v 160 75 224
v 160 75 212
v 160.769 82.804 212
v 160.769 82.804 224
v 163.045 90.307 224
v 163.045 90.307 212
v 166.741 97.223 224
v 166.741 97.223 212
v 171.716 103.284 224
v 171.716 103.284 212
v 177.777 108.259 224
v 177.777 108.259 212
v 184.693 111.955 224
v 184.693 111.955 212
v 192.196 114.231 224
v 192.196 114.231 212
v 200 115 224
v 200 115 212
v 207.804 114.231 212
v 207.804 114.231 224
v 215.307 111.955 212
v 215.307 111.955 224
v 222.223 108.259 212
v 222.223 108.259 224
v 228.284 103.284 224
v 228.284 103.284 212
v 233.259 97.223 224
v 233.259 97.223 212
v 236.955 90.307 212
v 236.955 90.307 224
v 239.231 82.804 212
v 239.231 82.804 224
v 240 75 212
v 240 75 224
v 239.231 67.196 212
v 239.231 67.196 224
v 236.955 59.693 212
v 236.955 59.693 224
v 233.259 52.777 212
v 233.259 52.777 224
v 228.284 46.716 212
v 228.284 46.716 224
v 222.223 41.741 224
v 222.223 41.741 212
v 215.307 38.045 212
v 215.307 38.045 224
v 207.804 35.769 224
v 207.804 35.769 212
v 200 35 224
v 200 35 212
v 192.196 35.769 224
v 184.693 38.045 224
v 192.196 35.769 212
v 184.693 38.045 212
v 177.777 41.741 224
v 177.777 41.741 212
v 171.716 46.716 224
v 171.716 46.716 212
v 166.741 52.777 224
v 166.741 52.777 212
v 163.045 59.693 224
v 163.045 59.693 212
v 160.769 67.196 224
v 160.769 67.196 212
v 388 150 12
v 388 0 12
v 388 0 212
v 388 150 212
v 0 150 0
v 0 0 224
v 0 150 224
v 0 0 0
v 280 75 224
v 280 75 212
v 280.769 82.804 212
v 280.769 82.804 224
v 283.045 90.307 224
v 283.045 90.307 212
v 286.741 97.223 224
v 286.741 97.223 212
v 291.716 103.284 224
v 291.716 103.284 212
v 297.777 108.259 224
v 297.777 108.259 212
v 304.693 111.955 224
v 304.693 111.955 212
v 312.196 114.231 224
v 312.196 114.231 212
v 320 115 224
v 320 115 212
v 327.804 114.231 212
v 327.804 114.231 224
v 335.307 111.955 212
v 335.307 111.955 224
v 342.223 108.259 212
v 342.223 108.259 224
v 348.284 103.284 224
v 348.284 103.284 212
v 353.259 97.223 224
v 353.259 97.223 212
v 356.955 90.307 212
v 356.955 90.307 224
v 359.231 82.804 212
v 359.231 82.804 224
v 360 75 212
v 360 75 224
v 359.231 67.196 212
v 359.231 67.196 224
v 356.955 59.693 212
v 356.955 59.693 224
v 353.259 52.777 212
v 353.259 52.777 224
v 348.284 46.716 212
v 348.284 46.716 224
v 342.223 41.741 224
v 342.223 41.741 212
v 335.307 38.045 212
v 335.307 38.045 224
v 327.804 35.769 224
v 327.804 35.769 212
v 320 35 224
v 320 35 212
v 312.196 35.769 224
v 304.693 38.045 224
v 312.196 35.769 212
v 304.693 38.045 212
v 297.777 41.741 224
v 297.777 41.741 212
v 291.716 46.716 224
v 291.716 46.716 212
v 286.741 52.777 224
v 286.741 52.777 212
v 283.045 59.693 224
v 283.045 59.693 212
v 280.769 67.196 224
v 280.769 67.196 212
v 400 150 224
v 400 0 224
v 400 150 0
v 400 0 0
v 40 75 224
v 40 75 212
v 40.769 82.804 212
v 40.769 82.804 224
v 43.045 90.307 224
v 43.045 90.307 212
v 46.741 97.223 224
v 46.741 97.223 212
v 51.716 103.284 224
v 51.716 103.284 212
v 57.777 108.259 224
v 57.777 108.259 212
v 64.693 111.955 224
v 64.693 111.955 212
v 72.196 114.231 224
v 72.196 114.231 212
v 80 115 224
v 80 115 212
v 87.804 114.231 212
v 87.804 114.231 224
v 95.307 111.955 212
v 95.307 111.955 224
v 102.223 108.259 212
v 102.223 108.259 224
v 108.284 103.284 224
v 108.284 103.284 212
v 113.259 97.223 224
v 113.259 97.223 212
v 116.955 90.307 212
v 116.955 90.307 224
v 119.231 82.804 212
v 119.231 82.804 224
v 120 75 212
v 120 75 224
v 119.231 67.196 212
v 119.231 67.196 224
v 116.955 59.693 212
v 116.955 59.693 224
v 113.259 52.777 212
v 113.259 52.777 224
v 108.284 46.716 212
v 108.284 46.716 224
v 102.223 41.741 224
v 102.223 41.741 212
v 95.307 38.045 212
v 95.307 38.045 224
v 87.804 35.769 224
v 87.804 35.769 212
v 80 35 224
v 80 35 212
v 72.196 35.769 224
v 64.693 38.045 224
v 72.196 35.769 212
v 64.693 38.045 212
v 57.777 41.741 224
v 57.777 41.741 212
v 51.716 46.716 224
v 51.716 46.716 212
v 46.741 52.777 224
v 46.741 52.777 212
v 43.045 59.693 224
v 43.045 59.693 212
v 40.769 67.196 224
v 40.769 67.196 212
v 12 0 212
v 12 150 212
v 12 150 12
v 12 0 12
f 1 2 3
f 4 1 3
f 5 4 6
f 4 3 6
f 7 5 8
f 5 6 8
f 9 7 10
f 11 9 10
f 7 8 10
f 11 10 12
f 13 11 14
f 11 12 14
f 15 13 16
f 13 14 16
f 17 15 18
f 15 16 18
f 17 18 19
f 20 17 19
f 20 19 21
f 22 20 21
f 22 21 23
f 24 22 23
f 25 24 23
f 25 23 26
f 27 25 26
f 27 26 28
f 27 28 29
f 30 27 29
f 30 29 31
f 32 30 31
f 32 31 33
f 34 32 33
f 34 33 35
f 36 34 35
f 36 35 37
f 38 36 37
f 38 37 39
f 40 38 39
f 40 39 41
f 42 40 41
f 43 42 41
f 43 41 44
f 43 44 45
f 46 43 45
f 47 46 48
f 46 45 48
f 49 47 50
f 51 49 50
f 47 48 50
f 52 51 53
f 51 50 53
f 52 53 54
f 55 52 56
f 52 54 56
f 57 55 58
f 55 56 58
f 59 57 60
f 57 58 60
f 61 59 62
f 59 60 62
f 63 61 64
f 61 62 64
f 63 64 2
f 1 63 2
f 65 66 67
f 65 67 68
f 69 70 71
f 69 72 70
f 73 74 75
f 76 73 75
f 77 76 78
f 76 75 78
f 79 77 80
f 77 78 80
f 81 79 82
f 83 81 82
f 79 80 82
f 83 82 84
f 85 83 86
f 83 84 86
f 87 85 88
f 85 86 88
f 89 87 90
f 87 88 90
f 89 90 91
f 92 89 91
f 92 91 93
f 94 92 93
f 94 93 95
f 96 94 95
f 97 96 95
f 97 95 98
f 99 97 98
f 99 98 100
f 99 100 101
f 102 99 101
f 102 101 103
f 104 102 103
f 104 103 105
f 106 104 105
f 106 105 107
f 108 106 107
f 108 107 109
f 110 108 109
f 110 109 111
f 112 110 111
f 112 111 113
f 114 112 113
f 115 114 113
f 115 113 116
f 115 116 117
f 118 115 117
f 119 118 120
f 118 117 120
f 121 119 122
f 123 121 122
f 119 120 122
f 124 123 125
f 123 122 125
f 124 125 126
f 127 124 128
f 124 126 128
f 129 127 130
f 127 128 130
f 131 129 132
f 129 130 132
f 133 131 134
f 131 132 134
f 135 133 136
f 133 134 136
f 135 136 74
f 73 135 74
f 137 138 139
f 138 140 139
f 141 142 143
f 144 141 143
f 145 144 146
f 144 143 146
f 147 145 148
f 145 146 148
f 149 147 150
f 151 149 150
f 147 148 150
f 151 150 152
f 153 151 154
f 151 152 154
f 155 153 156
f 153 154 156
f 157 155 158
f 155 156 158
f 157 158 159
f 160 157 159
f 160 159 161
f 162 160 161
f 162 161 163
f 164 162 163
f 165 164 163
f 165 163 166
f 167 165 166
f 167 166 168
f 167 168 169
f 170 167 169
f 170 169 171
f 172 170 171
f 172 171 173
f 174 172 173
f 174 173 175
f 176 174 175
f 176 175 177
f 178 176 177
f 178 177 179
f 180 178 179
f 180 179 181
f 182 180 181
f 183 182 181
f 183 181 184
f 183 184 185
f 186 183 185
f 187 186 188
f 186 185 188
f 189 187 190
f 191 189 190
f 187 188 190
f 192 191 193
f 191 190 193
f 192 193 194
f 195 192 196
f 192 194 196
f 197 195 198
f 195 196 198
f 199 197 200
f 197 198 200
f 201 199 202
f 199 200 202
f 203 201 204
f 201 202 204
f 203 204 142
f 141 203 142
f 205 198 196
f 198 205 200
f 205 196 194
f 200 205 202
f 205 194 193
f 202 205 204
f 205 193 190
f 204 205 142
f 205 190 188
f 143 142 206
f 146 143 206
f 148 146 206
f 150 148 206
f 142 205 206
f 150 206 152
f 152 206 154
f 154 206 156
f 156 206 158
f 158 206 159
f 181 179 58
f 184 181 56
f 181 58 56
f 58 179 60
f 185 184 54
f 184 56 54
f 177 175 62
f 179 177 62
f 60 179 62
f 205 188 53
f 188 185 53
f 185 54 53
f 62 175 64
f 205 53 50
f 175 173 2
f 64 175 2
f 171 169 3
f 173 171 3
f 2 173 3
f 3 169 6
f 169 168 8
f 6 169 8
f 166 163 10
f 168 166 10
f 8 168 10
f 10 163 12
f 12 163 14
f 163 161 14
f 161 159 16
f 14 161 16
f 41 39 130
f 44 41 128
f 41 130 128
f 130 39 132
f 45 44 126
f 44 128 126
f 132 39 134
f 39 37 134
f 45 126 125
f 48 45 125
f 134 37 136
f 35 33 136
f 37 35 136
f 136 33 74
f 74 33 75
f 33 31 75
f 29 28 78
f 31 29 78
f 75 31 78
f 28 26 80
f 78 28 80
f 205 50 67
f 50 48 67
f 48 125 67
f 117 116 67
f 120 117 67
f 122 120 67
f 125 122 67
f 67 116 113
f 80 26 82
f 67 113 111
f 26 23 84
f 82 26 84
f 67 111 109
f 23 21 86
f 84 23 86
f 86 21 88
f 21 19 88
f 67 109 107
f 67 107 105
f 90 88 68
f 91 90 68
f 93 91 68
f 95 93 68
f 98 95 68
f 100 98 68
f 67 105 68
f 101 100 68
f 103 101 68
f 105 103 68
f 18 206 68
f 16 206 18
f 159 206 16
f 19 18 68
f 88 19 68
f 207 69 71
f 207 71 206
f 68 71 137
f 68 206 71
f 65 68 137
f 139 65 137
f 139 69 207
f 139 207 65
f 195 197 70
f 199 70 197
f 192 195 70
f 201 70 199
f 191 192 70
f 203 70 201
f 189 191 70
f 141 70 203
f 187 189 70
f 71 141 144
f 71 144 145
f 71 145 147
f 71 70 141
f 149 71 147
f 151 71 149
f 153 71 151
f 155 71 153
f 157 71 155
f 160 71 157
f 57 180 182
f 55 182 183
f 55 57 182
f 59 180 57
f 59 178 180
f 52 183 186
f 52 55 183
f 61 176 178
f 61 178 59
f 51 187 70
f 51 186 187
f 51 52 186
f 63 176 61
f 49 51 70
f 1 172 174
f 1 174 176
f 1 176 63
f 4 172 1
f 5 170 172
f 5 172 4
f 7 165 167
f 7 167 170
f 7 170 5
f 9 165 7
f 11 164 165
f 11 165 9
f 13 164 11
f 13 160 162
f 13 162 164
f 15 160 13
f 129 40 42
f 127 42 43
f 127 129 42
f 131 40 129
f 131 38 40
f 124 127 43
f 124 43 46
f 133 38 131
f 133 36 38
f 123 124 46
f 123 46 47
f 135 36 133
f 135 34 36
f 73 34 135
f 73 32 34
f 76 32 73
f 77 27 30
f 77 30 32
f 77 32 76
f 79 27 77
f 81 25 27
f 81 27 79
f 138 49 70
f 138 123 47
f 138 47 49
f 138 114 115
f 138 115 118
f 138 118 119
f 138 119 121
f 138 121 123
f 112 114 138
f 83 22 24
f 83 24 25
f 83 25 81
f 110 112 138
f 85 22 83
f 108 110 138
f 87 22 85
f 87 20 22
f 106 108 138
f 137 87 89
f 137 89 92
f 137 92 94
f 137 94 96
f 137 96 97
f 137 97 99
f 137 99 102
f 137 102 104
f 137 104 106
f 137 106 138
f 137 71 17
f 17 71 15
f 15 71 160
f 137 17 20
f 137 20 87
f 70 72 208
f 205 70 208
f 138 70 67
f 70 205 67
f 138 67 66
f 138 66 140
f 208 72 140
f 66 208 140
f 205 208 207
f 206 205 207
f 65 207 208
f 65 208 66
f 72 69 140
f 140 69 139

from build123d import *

# Parameters (mm, degrees)
F0_W      = 400
F0_H      = 150
F1_DEPTH  = 12
F2_W      = 12
F2_H      = 150
F3_DEPTH  = 200
F4_W      = 12
F4_H      = 150
F5_DEPTH  = 200
F6_W      = 400
F6_H      = 150
F7_DEPTH  = 12
F9_D      = 80
F9_DEPTH  = 12
F10_D     = 80
F10_DEPTH = 12
F11_D     = 80
F11_DEPTH = 12


with BuildPart() as f1:
    # F0 (on Top) → F1 (new body)
    with BuildSketch(Plane.XY):
        with Locations((200, 75)):
            Rectangle(F0_W, F0_H)
    extrude(amount=F1_DEPTH)

    # F2 (on face) → F3 (join)
    with BuildSketch(Plane.XY.offset(12)):
        with Locations((6, 75)):
            Rectangle(F2_W, F2_H)
    extrude(amount=F3_DEPTH)

    # F4 (on face) → F5 (join)
    with BuildSketch(Plane.XY.offset(12)):
        with Locations((394, 75)):
            Rectangle(F4_W, F4_H)
    extrude(amount=F5_DEPTH)

    # F6 (on face) → F7 (join)
    with BuildSketch(Plane.XY.offset(212)):
        with Locations((200, 75)):
            Rectangle(F6_W, F6_H)
    extrude(amount=F7_DEPTH)

    # F9
    with Locations(Plane.XY.offset(224)):
        with Locations((80, 75)):
            Hole(F9_D / 2, depth=F9_DEPTH)

    # F10
    with Locations(Plane.XY.offset(224)):
        with Locations((200, 75)):
            Hole(F10_D / 2, depth=F10_DEPTH)

    # F11
    with Locations(Plane.XY.offset(224)):
        with Locations((320, 75)):
            Hole(F11_D / 2, depth=F11_DEPTH)


solid = f1.part
